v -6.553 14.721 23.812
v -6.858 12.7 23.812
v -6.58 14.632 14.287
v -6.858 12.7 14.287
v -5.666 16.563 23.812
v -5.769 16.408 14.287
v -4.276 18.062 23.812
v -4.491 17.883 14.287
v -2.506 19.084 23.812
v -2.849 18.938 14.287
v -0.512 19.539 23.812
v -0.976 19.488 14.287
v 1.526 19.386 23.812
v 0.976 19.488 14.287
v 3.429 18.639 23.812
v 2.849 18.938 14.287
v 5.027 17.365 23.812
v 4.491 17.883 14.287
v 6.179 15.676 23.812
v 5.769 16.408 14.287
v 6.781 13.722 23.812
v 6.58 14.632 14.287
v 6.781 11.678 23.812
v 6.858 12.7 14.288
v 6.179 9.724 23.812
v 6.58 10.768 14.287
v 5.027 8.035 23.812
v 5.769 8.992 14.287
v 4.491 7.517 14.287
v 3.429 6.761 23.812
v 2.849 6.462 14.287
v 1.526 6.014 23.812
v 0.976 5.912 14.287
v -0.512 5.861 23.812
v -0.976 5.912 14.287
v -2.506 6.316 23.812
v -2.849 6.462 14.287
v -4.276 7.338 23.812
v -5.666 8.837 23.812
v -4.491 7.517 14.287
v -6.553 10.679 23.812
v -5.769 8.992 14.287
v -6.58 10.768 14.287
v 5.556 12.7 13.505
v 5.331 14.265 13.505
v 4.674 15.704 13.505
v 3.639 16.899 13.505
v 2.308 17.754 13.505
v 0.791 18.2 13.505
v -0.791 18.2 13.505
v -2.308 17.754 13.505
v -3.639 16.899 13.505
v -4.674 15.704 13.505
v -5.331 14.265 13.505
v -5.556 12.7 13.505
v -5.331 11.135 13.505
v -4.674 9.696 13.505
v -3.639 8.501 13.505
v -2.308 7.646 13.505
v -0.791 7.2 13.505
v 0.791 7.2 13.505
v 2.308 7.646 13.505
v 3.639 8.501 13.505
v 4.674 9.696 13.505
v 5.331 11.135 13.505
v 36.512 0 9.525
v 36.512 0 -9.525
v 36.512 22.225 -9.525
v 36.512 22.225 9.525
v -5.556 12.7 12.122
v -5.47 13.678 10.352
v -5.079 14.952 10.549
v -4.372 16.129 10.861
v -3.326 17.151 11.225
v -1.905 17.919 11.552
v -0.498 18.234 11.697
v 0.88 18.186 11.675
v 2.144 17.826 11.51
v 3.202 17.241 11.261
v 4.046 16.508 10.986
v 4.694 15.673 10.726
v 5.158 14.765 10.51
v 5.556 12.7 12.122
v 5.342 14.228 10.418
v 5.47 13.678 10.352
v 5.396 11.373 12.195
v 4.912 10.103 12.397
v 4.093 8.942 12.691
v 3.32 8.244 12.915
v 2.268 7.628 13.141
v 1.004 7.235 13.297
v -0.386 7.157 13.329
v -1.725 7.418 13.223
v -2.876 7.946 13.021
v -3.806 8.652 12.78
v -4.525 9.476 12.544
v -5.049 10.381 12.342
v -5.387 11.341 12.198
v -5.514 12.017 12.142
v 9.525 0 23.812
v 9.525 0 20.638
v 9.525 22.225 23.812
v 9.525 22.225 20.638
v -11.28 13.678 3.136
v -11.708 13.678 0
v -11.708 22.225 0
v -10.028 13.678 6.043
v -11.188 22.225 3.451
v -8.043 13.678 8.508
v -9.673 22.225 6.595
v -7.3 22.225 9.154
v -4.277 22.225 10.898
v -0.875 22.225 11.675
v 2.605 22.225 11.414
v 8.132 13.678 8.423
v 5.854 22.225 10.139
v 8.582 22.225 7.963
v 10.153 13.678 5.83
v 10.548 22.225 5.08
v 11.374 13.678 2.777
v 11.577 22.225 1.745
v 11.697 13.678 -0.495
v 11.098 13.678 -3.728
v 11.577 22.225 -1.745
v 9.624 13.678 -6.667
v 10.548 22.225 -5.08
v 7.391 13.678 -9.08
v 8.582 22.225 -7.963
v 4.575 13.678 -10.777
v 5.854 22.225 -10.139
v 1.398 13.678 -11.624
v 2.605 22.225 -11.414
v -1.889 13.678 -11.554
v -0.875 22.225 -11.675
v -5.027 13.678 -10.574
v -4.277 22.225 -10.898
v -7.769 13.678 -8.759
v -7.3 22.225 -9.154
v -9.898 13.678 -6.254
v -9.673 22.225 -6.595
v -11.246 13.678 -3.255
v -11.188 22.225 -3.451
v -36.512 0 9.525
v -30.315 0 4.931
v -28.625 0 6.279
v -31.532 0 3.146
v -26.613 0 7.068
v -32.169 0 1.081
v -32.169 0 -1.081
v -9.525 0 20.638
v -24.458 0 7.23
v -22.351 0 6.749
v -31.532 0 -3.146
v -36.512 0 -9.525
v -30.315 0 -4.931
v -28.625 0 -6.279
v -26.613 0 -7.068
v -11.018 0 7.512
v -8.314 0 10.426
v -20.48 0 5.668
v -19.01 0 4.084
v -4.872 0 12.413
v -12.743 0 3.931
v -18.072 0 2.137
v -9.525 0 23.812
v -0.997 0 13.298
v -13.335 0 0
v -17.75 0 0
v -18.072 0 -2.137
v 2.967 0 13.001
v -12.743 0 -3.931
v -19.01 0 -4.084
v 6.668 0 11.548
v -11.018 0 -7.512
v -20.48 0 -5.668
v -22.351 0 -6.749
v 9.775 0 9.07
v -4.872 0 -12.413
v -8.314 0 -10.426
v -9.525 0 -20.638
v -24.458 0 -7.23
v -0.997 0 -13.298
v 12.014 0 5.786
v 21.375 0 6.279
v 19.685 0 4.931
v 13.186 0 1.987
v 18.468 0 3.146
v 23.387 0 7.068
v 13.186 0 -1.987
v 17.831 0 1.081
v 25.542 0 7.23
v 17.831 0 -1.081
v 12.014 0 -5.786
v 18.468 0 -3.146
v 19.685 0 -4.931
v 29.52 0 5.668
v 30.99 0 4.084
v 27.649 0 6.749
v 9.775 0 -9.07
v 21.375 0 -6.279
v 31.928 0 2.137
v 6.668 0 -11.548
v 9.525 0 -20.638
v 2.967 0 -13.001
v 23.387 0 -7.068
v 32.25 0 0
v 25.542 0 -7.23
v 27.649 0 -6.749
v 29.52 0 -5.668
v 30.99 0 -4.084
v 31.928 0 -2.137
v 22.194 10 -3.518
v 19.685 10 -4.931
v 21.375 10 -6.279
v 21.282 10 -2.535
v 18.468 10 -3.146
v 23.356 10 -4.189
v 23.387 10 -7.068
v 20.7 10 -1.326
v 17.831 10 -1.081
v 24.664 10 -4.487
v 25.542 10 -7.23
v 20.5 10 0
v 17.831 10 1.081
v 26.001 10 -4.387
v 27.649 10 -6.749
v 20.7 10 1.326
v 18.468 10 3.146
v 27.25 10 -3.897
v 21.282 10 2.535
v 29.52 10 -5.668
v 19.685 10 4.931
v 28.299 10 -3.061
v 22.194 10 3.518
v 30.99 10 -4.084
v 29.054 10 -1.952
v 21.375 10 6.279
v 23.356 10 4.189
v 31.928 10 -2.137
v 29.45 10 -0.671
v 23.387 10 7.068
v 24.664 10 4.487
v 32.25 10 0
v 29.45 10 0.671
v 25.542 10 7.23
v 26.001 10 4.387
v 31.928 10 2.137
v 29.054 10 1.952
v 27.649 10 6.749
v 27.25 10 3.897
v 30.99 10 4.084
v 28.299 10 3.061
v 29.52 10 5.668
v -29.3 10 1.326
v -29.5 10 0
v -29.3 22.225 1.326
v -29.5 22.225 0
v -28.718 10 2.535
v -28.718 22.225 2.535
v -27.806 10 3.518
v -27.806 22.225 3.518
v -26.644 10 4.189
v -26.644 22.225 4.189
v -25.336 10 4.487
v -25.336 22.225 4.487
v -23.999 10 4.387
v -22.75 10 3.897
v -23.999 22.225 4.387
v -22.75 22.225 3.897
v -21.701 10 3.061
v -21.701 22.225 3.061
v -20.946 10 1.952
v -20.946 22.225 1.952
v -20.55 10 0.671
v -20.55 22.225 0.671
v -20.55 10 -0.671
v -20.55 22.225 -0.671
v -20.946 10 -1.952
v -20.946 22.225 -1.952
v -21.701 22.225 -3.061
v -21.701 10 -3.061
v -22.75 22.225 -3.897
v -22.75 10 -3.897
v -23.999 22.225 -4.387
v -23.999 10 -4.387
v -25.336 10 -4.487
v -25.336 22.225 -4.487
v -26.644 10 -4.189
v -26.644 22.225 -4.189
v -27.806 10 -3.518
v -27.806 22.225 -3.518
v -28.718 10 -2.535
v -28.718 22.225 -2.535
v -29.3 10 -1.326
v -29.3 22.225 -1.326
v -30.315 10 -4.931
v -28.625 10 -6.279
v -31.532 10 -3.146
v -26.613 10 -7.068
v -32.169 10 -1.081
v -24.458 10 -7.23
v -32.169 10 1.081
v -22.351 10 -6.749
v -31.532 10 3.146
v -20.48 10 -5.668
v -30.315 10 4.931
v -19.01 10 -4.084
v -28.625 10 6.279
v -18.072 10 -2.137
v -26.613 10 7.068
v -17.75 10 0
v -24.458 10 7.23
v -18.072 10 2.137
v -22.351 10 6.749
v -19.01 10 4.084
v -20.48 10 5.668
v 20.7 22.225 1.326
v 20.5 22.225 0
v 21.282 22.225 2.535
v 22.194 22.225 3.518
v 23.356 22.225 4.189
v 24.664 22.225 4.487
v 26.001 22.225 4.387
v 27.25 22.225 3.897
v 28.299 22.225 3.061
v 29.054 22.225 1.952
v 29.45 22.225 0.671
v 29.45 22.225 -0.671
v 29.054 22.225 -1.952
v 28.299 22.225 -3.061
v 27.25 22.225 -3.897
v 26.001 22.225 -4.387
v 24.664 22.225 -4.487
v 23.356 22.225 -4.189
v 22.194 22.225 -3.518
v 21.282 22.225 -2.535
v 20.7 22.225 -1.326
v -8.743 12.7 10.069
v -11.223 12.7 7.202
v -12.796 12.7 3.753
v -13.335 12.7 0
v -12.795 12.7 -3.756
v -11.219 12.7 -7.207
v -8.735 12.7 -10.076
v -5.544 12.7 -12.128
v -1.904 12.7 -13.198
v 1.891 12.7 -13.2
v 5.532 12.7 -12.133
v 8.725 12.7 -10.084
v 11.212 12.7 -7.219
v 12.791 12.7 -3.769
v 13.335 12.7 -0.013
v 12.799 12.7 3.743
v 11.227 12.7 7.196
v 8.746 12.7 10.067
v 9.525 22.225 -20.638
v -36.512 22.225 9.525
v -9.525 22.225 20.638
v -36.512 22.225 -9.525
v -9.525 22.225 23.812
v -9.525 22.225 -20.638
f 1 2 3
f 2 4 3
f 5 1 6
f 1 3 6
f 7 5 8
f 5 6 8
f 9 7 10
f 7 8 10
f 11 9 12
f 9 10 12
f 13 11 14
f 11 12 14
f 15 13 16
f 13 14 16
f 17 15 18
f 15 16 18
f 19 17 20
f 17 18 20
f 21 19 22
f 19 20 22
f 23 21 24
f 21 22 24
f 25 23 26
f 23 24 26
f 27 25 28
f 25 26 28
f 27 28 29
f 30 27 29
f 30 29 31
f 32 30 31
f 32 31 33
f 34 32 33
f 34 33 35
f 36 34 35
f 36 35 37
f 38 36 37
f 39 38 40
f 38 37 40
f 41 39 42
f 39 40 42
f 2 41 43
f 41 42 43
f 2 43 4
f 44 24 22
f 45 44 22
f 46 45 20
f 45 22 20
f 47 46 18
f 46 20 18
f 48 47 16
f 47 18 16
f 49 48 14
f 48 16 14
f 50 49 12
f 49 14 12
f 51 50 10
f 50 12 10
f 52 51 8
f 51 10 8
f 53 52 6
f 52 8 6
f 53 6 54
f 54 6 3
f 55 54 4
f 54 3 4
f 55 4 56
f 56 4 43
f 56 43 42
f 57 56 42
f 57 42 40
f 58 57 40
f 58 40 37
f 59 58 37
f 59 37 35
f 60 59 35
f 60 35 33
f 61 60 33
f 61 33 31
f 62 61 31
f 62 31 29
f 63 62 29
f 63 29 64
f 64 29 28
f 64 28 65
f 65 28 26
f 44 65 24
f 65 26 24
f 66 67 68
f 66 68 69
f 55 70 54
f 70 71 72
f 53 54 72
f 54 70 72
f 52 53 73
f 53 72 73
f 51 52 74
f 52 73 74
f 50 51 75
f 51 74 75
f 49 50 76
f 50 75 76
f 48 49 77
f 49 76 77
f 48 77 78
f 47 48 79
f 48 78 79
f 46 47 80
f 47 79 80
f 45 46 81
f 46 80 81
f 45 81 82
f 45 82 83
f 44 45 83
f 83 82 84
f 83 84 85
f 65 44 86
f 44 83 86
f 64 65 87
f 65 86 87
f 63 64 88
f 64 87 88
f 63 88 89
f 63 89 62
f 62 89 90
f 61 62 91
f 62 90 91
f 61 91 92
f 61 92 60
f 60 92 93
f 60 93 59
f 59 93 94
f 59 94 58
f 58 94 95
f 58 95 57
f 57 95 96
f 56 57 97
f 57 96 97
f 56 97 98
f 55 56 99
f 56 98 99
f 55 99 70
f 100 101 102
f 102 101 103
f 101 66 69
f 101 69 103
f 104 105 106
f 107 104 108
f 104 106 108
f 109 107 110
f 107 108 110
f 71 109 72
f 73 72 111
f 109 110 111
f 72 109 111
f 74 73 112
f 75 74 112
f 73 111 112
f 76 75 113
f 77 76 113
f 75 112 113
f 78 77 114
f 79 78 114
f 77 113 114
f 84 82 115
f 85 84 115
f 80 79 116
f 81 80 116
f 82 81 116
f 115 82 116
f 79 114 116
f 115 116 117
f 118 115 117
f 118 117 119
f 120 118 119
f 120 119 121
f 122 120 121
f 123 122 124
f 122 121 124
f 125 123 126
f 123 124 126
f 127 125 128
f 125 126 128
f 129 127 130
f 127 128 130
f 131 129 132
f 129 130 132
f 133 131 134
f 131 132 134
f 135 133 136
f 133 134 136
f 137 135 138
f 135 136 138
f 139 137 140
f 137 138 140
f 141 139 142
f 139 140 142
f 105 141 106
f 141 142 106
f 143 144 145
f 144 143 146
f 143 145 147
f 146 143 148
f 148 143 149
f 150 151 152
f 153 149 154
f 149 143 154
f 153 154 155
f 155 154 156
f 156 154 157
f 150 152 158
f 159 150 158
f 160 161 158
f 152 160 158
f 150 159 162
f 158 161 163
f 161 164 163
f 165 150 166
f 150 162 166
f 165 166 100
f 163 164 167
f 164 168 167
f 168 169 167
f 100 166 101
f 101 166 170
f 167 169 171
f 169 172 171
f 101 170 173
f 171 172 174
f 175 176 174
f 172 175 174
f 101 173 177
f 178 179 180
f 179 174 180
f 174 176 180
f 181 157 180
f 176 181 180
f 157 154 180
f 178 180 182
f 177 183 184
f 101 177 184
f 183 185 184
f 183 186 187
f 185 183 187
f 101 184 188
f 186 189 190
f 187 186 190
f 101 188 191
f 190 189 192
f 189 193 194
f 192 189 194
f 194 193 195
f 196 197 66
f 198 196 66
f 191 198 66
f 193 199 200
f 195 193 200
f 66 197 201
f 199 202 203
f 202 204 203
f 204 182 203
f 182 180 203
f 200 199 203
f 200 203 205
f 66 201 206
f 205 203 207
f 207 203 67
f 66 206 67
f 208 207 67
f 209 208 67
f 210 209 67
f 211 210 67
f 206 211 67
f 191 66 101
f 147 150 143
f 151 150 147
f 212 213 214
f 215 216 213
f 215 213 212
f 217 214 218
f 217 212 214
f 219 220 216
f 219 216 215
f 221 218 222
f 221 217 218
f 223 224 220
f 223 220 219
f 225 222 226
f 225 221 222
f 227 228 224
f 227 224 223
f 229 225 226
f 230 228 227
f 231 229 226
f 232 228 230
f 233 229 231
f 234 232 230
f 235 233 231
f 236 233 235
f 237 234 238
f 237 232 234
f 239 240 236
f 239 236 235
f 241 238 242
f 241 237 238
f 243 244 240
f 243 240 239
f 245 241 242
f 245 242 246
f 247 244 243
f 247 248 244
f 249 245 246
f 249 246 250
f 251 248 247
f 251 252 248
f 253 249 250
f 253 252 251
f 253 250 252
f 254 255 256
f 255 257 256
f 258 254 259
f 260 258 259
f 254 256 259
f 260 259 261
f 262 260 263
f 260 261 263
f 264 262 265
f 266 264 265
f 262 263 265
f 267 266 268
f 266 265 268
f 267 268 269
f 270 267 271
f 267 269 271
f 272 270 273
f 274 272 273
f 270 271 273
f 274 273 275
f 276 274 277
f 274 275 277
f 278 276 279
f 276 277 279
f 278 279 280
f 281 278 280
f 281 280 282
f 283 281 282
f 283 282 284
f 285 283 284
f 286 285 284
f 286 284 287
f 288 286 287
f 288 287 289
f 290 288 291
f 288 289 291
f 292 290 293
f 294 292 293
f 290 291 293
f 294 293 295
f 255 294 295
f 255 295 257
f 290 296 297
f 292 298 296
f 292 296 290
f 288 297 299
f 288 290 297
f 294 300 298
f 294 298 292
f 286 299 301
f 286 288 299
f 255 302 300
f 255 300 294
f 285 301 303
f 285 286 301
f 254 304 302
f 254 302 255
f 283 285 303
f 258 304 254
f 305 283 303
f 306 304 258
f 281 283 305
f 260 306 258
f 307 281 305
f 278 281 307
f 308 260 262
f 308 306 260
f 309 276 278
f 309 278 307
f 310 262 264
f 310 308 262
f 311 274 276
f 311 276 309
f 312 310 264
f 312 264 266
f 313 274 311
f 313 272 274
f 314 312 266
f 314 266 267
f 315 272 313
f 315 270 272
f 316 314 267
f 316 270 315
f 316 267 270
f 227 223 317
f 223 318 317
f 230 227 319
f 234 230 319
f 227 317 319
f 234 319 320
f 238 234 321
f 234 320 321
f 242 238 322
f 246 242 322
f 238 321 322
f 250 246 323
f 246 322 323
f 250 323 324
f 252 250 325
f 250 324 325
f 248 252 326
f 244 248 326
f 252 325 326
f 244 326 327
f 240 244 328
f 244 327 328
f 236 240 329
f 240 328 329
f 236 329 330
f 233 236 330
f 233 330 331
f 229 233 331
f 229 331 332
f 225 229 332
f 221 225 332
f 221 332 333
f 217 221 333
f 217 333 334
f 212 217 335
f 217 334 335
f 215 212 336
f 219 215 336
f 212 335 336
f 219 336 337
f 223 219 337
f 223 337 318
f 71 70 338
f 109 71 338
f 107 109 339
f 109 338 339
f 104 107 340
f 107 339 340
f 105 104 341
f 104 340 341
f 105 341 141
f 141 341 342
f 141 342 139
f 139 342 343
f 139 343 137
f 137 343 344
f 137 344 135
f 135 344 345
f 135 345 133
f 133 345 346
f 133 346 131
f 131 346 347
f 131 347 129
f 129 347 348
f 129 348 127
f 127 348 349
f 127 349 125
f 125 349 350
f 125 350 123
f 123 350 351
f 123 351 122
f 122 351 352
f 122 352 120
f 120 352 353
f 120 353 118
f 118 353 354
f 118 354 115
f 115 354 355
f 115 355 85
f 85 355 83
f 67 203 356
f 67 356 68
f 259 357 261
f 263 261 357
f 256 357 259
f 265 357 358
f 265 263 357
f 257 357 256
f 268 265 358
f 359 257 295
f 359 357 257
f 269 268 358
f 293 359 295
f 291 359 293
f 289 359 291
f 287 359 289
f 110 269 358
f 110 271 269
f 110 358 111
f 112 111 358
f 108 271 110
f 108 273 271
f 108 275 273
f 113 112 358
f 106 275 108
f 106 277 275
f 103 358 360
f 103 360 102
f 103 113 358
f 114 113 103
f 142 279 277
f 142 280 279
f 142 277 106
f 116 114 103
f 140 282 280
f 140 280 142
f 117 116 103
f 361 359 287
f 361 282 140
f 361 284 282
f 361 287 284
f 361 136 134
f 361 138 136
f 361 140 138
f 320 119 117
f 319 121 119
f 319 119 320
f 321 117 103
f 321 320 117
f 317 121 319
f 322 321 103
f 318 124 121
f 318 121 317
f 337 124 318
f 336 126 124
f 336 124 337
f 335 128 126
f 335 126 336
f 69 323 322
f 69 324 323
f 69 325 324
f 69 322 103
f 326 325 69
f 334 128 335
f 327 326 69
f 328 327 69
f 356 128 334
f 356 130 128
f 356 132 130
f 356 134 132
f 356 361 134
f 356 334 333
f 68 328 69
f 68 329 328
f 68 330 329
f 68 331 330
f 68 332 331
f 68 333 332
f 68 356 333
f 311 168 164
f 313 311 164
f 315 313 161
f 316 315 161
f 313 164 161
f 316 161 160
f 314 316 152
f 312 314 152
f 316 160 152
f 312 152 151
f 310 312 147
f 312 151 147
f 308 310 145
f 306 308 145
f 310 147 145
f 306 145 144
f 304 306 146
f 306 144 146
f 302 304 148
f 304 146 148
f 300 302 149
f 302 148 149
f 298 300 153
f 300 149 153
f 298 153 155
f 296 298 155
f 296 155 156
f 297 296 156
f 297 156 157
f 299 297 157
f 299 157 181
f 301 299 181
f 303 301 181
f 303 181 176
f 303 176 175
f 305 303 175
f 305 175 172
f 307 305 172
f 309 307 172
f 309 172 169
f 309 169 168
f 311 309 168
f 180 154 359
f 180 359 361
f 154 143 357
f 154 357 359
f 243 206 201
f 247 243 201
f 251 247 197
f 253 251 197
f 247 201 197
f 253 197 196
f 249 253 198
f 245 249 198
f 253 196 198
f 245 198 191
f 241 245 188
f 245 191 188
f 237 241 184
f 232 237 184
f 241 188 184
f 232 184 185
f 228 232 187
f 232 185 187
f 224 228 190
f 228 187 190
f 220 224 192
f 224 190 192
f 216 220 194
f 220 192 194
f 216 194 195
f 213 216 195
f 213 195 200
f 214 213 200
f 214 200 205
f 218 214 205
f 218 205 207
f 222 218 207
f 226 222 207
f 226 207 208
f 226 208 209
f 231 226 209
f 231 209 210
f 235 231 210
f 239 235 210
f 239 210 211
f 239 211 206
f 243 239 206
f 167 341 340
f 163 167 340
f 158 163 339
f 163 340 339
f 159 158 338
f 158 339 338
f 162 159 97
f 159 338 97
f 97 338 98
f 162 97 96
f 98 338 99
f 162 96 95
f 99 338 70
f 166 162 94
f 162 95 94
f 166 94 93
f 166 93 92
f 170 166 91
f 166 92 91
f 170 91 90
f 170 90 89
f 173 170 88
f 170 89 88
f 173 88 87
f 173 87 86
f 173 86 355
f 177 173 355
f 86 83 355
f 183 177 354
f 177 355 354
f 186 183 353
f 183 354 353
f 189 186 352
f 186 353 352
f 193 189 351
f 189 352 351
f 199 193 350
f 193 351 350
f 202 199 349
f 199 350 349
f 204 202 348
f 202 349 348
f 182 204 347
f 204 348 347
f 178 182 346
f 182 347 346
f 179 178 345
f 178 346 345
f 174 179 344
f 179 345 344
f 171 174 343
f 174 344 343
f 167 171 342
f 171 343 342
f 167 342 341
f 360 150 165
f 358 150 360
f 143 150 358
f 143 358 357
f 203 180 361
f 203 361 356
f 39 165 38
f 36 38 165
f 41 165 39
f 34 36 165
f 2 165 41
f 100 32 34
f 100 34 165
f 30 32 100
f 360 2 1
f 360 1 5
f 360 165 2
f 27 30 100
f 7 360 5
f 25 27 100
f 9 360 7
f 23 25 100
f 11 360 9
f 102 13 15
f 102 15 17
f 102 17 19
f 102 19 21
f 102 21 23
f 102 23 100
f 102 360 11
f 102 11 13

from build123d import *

# Parameters (mm, degrees)
F1_DEPTH        = 22.225
F3_D            = 23.415625
F4_D            = 26.67
F4_DEPTH        = 12.7
F4_TIP          = 8.0124763547
F5_W            = 19.05
F5_H            = 22.225
F6_DEPTH        = 3.175
F8_D            = 11.1125
F8_DEPTH        = 25.4
F8_TIP          = 3.3385318145
F9_D            = 13.716
F9_DEPTH        = 9.525
F9_TIP          = 4.1207021253
F11_D           = 9
F11_CBORE_D     = 14.5
F11_CBORE_DEPTH = 10


with BuildPart() as f1:
    # F0 (on Front) → F1 (new body)
    with BuildSketch(Plane.XZ):
        Polygon((-9.525, 20.6375), (-36.5125, 9.525), (-36.5125, -9.525), (-9.525, -20.6375), (9.525, -20.6375), (36.5125, -9.525), (36.5125, 9.525), (9.525, 20.6375), align=None)
    extrude(amount=-F1_DEPTH)

    # F3 (through all)
    with Locations(Plane.XZ):
        with Locations((0, 0)):
            Hole(F3_D / 2)

    # F4
    with Locations(Plane.XZ):
        with Locations((0, 0)):
            Hole(F4_D / 2, depth=F4_DEPTH)
            with Locations((0, 0, -(F4_DEPTH + F4_TIP / 2))):  # 118° drill point
                Cone(0, F4_D / 2, F4_TIP, mode=Mode.SUBTRACT)

    # F5 (on face) → F6 (join)
    with BuildSketch(Plane.XY.offset(20.6375)):
        with Locations((0, 11.1125)):
            Rectangle(F5_W, F5_H)
    extrude(amount=F6_DEPTH)

    # F8
    with Locations(Plane.XY.offset(23.8125)):
        with Locations((0, 12.7)):
            Hole(F8_D / 2, depth=F8_DEPTH)
            with Locations((0, 0, -(F8_DEPTH + F8_TIP / 2))):  # 118° drill point
                Cone(0, F8_D / 2, F8_TIP, mode=Mode.SUBTRACT)

    # F9
    with Locations(Plane.XY.offset(23.8125)):
        with Locations((0, 12.7)):
            Hole(F9_D / 2, depth=F9_DEPTH)
            with Locations((0, 0, -(F9_DEPTH + F9_TIP / 2))):  # 118° drill point
                Cone(0, F9_D / 2, F9_TIP, mode=Mode.SUBTRACT)

    # F11 (through all)
    with Locations(Plane.XZ):
        with Locations((-25, 0), (25, 0)):
            CounterBoreHole(F11_D / 2, F11_CBORE_D / 2, F11_CBORE_DEPTH)


solid = f1.part
